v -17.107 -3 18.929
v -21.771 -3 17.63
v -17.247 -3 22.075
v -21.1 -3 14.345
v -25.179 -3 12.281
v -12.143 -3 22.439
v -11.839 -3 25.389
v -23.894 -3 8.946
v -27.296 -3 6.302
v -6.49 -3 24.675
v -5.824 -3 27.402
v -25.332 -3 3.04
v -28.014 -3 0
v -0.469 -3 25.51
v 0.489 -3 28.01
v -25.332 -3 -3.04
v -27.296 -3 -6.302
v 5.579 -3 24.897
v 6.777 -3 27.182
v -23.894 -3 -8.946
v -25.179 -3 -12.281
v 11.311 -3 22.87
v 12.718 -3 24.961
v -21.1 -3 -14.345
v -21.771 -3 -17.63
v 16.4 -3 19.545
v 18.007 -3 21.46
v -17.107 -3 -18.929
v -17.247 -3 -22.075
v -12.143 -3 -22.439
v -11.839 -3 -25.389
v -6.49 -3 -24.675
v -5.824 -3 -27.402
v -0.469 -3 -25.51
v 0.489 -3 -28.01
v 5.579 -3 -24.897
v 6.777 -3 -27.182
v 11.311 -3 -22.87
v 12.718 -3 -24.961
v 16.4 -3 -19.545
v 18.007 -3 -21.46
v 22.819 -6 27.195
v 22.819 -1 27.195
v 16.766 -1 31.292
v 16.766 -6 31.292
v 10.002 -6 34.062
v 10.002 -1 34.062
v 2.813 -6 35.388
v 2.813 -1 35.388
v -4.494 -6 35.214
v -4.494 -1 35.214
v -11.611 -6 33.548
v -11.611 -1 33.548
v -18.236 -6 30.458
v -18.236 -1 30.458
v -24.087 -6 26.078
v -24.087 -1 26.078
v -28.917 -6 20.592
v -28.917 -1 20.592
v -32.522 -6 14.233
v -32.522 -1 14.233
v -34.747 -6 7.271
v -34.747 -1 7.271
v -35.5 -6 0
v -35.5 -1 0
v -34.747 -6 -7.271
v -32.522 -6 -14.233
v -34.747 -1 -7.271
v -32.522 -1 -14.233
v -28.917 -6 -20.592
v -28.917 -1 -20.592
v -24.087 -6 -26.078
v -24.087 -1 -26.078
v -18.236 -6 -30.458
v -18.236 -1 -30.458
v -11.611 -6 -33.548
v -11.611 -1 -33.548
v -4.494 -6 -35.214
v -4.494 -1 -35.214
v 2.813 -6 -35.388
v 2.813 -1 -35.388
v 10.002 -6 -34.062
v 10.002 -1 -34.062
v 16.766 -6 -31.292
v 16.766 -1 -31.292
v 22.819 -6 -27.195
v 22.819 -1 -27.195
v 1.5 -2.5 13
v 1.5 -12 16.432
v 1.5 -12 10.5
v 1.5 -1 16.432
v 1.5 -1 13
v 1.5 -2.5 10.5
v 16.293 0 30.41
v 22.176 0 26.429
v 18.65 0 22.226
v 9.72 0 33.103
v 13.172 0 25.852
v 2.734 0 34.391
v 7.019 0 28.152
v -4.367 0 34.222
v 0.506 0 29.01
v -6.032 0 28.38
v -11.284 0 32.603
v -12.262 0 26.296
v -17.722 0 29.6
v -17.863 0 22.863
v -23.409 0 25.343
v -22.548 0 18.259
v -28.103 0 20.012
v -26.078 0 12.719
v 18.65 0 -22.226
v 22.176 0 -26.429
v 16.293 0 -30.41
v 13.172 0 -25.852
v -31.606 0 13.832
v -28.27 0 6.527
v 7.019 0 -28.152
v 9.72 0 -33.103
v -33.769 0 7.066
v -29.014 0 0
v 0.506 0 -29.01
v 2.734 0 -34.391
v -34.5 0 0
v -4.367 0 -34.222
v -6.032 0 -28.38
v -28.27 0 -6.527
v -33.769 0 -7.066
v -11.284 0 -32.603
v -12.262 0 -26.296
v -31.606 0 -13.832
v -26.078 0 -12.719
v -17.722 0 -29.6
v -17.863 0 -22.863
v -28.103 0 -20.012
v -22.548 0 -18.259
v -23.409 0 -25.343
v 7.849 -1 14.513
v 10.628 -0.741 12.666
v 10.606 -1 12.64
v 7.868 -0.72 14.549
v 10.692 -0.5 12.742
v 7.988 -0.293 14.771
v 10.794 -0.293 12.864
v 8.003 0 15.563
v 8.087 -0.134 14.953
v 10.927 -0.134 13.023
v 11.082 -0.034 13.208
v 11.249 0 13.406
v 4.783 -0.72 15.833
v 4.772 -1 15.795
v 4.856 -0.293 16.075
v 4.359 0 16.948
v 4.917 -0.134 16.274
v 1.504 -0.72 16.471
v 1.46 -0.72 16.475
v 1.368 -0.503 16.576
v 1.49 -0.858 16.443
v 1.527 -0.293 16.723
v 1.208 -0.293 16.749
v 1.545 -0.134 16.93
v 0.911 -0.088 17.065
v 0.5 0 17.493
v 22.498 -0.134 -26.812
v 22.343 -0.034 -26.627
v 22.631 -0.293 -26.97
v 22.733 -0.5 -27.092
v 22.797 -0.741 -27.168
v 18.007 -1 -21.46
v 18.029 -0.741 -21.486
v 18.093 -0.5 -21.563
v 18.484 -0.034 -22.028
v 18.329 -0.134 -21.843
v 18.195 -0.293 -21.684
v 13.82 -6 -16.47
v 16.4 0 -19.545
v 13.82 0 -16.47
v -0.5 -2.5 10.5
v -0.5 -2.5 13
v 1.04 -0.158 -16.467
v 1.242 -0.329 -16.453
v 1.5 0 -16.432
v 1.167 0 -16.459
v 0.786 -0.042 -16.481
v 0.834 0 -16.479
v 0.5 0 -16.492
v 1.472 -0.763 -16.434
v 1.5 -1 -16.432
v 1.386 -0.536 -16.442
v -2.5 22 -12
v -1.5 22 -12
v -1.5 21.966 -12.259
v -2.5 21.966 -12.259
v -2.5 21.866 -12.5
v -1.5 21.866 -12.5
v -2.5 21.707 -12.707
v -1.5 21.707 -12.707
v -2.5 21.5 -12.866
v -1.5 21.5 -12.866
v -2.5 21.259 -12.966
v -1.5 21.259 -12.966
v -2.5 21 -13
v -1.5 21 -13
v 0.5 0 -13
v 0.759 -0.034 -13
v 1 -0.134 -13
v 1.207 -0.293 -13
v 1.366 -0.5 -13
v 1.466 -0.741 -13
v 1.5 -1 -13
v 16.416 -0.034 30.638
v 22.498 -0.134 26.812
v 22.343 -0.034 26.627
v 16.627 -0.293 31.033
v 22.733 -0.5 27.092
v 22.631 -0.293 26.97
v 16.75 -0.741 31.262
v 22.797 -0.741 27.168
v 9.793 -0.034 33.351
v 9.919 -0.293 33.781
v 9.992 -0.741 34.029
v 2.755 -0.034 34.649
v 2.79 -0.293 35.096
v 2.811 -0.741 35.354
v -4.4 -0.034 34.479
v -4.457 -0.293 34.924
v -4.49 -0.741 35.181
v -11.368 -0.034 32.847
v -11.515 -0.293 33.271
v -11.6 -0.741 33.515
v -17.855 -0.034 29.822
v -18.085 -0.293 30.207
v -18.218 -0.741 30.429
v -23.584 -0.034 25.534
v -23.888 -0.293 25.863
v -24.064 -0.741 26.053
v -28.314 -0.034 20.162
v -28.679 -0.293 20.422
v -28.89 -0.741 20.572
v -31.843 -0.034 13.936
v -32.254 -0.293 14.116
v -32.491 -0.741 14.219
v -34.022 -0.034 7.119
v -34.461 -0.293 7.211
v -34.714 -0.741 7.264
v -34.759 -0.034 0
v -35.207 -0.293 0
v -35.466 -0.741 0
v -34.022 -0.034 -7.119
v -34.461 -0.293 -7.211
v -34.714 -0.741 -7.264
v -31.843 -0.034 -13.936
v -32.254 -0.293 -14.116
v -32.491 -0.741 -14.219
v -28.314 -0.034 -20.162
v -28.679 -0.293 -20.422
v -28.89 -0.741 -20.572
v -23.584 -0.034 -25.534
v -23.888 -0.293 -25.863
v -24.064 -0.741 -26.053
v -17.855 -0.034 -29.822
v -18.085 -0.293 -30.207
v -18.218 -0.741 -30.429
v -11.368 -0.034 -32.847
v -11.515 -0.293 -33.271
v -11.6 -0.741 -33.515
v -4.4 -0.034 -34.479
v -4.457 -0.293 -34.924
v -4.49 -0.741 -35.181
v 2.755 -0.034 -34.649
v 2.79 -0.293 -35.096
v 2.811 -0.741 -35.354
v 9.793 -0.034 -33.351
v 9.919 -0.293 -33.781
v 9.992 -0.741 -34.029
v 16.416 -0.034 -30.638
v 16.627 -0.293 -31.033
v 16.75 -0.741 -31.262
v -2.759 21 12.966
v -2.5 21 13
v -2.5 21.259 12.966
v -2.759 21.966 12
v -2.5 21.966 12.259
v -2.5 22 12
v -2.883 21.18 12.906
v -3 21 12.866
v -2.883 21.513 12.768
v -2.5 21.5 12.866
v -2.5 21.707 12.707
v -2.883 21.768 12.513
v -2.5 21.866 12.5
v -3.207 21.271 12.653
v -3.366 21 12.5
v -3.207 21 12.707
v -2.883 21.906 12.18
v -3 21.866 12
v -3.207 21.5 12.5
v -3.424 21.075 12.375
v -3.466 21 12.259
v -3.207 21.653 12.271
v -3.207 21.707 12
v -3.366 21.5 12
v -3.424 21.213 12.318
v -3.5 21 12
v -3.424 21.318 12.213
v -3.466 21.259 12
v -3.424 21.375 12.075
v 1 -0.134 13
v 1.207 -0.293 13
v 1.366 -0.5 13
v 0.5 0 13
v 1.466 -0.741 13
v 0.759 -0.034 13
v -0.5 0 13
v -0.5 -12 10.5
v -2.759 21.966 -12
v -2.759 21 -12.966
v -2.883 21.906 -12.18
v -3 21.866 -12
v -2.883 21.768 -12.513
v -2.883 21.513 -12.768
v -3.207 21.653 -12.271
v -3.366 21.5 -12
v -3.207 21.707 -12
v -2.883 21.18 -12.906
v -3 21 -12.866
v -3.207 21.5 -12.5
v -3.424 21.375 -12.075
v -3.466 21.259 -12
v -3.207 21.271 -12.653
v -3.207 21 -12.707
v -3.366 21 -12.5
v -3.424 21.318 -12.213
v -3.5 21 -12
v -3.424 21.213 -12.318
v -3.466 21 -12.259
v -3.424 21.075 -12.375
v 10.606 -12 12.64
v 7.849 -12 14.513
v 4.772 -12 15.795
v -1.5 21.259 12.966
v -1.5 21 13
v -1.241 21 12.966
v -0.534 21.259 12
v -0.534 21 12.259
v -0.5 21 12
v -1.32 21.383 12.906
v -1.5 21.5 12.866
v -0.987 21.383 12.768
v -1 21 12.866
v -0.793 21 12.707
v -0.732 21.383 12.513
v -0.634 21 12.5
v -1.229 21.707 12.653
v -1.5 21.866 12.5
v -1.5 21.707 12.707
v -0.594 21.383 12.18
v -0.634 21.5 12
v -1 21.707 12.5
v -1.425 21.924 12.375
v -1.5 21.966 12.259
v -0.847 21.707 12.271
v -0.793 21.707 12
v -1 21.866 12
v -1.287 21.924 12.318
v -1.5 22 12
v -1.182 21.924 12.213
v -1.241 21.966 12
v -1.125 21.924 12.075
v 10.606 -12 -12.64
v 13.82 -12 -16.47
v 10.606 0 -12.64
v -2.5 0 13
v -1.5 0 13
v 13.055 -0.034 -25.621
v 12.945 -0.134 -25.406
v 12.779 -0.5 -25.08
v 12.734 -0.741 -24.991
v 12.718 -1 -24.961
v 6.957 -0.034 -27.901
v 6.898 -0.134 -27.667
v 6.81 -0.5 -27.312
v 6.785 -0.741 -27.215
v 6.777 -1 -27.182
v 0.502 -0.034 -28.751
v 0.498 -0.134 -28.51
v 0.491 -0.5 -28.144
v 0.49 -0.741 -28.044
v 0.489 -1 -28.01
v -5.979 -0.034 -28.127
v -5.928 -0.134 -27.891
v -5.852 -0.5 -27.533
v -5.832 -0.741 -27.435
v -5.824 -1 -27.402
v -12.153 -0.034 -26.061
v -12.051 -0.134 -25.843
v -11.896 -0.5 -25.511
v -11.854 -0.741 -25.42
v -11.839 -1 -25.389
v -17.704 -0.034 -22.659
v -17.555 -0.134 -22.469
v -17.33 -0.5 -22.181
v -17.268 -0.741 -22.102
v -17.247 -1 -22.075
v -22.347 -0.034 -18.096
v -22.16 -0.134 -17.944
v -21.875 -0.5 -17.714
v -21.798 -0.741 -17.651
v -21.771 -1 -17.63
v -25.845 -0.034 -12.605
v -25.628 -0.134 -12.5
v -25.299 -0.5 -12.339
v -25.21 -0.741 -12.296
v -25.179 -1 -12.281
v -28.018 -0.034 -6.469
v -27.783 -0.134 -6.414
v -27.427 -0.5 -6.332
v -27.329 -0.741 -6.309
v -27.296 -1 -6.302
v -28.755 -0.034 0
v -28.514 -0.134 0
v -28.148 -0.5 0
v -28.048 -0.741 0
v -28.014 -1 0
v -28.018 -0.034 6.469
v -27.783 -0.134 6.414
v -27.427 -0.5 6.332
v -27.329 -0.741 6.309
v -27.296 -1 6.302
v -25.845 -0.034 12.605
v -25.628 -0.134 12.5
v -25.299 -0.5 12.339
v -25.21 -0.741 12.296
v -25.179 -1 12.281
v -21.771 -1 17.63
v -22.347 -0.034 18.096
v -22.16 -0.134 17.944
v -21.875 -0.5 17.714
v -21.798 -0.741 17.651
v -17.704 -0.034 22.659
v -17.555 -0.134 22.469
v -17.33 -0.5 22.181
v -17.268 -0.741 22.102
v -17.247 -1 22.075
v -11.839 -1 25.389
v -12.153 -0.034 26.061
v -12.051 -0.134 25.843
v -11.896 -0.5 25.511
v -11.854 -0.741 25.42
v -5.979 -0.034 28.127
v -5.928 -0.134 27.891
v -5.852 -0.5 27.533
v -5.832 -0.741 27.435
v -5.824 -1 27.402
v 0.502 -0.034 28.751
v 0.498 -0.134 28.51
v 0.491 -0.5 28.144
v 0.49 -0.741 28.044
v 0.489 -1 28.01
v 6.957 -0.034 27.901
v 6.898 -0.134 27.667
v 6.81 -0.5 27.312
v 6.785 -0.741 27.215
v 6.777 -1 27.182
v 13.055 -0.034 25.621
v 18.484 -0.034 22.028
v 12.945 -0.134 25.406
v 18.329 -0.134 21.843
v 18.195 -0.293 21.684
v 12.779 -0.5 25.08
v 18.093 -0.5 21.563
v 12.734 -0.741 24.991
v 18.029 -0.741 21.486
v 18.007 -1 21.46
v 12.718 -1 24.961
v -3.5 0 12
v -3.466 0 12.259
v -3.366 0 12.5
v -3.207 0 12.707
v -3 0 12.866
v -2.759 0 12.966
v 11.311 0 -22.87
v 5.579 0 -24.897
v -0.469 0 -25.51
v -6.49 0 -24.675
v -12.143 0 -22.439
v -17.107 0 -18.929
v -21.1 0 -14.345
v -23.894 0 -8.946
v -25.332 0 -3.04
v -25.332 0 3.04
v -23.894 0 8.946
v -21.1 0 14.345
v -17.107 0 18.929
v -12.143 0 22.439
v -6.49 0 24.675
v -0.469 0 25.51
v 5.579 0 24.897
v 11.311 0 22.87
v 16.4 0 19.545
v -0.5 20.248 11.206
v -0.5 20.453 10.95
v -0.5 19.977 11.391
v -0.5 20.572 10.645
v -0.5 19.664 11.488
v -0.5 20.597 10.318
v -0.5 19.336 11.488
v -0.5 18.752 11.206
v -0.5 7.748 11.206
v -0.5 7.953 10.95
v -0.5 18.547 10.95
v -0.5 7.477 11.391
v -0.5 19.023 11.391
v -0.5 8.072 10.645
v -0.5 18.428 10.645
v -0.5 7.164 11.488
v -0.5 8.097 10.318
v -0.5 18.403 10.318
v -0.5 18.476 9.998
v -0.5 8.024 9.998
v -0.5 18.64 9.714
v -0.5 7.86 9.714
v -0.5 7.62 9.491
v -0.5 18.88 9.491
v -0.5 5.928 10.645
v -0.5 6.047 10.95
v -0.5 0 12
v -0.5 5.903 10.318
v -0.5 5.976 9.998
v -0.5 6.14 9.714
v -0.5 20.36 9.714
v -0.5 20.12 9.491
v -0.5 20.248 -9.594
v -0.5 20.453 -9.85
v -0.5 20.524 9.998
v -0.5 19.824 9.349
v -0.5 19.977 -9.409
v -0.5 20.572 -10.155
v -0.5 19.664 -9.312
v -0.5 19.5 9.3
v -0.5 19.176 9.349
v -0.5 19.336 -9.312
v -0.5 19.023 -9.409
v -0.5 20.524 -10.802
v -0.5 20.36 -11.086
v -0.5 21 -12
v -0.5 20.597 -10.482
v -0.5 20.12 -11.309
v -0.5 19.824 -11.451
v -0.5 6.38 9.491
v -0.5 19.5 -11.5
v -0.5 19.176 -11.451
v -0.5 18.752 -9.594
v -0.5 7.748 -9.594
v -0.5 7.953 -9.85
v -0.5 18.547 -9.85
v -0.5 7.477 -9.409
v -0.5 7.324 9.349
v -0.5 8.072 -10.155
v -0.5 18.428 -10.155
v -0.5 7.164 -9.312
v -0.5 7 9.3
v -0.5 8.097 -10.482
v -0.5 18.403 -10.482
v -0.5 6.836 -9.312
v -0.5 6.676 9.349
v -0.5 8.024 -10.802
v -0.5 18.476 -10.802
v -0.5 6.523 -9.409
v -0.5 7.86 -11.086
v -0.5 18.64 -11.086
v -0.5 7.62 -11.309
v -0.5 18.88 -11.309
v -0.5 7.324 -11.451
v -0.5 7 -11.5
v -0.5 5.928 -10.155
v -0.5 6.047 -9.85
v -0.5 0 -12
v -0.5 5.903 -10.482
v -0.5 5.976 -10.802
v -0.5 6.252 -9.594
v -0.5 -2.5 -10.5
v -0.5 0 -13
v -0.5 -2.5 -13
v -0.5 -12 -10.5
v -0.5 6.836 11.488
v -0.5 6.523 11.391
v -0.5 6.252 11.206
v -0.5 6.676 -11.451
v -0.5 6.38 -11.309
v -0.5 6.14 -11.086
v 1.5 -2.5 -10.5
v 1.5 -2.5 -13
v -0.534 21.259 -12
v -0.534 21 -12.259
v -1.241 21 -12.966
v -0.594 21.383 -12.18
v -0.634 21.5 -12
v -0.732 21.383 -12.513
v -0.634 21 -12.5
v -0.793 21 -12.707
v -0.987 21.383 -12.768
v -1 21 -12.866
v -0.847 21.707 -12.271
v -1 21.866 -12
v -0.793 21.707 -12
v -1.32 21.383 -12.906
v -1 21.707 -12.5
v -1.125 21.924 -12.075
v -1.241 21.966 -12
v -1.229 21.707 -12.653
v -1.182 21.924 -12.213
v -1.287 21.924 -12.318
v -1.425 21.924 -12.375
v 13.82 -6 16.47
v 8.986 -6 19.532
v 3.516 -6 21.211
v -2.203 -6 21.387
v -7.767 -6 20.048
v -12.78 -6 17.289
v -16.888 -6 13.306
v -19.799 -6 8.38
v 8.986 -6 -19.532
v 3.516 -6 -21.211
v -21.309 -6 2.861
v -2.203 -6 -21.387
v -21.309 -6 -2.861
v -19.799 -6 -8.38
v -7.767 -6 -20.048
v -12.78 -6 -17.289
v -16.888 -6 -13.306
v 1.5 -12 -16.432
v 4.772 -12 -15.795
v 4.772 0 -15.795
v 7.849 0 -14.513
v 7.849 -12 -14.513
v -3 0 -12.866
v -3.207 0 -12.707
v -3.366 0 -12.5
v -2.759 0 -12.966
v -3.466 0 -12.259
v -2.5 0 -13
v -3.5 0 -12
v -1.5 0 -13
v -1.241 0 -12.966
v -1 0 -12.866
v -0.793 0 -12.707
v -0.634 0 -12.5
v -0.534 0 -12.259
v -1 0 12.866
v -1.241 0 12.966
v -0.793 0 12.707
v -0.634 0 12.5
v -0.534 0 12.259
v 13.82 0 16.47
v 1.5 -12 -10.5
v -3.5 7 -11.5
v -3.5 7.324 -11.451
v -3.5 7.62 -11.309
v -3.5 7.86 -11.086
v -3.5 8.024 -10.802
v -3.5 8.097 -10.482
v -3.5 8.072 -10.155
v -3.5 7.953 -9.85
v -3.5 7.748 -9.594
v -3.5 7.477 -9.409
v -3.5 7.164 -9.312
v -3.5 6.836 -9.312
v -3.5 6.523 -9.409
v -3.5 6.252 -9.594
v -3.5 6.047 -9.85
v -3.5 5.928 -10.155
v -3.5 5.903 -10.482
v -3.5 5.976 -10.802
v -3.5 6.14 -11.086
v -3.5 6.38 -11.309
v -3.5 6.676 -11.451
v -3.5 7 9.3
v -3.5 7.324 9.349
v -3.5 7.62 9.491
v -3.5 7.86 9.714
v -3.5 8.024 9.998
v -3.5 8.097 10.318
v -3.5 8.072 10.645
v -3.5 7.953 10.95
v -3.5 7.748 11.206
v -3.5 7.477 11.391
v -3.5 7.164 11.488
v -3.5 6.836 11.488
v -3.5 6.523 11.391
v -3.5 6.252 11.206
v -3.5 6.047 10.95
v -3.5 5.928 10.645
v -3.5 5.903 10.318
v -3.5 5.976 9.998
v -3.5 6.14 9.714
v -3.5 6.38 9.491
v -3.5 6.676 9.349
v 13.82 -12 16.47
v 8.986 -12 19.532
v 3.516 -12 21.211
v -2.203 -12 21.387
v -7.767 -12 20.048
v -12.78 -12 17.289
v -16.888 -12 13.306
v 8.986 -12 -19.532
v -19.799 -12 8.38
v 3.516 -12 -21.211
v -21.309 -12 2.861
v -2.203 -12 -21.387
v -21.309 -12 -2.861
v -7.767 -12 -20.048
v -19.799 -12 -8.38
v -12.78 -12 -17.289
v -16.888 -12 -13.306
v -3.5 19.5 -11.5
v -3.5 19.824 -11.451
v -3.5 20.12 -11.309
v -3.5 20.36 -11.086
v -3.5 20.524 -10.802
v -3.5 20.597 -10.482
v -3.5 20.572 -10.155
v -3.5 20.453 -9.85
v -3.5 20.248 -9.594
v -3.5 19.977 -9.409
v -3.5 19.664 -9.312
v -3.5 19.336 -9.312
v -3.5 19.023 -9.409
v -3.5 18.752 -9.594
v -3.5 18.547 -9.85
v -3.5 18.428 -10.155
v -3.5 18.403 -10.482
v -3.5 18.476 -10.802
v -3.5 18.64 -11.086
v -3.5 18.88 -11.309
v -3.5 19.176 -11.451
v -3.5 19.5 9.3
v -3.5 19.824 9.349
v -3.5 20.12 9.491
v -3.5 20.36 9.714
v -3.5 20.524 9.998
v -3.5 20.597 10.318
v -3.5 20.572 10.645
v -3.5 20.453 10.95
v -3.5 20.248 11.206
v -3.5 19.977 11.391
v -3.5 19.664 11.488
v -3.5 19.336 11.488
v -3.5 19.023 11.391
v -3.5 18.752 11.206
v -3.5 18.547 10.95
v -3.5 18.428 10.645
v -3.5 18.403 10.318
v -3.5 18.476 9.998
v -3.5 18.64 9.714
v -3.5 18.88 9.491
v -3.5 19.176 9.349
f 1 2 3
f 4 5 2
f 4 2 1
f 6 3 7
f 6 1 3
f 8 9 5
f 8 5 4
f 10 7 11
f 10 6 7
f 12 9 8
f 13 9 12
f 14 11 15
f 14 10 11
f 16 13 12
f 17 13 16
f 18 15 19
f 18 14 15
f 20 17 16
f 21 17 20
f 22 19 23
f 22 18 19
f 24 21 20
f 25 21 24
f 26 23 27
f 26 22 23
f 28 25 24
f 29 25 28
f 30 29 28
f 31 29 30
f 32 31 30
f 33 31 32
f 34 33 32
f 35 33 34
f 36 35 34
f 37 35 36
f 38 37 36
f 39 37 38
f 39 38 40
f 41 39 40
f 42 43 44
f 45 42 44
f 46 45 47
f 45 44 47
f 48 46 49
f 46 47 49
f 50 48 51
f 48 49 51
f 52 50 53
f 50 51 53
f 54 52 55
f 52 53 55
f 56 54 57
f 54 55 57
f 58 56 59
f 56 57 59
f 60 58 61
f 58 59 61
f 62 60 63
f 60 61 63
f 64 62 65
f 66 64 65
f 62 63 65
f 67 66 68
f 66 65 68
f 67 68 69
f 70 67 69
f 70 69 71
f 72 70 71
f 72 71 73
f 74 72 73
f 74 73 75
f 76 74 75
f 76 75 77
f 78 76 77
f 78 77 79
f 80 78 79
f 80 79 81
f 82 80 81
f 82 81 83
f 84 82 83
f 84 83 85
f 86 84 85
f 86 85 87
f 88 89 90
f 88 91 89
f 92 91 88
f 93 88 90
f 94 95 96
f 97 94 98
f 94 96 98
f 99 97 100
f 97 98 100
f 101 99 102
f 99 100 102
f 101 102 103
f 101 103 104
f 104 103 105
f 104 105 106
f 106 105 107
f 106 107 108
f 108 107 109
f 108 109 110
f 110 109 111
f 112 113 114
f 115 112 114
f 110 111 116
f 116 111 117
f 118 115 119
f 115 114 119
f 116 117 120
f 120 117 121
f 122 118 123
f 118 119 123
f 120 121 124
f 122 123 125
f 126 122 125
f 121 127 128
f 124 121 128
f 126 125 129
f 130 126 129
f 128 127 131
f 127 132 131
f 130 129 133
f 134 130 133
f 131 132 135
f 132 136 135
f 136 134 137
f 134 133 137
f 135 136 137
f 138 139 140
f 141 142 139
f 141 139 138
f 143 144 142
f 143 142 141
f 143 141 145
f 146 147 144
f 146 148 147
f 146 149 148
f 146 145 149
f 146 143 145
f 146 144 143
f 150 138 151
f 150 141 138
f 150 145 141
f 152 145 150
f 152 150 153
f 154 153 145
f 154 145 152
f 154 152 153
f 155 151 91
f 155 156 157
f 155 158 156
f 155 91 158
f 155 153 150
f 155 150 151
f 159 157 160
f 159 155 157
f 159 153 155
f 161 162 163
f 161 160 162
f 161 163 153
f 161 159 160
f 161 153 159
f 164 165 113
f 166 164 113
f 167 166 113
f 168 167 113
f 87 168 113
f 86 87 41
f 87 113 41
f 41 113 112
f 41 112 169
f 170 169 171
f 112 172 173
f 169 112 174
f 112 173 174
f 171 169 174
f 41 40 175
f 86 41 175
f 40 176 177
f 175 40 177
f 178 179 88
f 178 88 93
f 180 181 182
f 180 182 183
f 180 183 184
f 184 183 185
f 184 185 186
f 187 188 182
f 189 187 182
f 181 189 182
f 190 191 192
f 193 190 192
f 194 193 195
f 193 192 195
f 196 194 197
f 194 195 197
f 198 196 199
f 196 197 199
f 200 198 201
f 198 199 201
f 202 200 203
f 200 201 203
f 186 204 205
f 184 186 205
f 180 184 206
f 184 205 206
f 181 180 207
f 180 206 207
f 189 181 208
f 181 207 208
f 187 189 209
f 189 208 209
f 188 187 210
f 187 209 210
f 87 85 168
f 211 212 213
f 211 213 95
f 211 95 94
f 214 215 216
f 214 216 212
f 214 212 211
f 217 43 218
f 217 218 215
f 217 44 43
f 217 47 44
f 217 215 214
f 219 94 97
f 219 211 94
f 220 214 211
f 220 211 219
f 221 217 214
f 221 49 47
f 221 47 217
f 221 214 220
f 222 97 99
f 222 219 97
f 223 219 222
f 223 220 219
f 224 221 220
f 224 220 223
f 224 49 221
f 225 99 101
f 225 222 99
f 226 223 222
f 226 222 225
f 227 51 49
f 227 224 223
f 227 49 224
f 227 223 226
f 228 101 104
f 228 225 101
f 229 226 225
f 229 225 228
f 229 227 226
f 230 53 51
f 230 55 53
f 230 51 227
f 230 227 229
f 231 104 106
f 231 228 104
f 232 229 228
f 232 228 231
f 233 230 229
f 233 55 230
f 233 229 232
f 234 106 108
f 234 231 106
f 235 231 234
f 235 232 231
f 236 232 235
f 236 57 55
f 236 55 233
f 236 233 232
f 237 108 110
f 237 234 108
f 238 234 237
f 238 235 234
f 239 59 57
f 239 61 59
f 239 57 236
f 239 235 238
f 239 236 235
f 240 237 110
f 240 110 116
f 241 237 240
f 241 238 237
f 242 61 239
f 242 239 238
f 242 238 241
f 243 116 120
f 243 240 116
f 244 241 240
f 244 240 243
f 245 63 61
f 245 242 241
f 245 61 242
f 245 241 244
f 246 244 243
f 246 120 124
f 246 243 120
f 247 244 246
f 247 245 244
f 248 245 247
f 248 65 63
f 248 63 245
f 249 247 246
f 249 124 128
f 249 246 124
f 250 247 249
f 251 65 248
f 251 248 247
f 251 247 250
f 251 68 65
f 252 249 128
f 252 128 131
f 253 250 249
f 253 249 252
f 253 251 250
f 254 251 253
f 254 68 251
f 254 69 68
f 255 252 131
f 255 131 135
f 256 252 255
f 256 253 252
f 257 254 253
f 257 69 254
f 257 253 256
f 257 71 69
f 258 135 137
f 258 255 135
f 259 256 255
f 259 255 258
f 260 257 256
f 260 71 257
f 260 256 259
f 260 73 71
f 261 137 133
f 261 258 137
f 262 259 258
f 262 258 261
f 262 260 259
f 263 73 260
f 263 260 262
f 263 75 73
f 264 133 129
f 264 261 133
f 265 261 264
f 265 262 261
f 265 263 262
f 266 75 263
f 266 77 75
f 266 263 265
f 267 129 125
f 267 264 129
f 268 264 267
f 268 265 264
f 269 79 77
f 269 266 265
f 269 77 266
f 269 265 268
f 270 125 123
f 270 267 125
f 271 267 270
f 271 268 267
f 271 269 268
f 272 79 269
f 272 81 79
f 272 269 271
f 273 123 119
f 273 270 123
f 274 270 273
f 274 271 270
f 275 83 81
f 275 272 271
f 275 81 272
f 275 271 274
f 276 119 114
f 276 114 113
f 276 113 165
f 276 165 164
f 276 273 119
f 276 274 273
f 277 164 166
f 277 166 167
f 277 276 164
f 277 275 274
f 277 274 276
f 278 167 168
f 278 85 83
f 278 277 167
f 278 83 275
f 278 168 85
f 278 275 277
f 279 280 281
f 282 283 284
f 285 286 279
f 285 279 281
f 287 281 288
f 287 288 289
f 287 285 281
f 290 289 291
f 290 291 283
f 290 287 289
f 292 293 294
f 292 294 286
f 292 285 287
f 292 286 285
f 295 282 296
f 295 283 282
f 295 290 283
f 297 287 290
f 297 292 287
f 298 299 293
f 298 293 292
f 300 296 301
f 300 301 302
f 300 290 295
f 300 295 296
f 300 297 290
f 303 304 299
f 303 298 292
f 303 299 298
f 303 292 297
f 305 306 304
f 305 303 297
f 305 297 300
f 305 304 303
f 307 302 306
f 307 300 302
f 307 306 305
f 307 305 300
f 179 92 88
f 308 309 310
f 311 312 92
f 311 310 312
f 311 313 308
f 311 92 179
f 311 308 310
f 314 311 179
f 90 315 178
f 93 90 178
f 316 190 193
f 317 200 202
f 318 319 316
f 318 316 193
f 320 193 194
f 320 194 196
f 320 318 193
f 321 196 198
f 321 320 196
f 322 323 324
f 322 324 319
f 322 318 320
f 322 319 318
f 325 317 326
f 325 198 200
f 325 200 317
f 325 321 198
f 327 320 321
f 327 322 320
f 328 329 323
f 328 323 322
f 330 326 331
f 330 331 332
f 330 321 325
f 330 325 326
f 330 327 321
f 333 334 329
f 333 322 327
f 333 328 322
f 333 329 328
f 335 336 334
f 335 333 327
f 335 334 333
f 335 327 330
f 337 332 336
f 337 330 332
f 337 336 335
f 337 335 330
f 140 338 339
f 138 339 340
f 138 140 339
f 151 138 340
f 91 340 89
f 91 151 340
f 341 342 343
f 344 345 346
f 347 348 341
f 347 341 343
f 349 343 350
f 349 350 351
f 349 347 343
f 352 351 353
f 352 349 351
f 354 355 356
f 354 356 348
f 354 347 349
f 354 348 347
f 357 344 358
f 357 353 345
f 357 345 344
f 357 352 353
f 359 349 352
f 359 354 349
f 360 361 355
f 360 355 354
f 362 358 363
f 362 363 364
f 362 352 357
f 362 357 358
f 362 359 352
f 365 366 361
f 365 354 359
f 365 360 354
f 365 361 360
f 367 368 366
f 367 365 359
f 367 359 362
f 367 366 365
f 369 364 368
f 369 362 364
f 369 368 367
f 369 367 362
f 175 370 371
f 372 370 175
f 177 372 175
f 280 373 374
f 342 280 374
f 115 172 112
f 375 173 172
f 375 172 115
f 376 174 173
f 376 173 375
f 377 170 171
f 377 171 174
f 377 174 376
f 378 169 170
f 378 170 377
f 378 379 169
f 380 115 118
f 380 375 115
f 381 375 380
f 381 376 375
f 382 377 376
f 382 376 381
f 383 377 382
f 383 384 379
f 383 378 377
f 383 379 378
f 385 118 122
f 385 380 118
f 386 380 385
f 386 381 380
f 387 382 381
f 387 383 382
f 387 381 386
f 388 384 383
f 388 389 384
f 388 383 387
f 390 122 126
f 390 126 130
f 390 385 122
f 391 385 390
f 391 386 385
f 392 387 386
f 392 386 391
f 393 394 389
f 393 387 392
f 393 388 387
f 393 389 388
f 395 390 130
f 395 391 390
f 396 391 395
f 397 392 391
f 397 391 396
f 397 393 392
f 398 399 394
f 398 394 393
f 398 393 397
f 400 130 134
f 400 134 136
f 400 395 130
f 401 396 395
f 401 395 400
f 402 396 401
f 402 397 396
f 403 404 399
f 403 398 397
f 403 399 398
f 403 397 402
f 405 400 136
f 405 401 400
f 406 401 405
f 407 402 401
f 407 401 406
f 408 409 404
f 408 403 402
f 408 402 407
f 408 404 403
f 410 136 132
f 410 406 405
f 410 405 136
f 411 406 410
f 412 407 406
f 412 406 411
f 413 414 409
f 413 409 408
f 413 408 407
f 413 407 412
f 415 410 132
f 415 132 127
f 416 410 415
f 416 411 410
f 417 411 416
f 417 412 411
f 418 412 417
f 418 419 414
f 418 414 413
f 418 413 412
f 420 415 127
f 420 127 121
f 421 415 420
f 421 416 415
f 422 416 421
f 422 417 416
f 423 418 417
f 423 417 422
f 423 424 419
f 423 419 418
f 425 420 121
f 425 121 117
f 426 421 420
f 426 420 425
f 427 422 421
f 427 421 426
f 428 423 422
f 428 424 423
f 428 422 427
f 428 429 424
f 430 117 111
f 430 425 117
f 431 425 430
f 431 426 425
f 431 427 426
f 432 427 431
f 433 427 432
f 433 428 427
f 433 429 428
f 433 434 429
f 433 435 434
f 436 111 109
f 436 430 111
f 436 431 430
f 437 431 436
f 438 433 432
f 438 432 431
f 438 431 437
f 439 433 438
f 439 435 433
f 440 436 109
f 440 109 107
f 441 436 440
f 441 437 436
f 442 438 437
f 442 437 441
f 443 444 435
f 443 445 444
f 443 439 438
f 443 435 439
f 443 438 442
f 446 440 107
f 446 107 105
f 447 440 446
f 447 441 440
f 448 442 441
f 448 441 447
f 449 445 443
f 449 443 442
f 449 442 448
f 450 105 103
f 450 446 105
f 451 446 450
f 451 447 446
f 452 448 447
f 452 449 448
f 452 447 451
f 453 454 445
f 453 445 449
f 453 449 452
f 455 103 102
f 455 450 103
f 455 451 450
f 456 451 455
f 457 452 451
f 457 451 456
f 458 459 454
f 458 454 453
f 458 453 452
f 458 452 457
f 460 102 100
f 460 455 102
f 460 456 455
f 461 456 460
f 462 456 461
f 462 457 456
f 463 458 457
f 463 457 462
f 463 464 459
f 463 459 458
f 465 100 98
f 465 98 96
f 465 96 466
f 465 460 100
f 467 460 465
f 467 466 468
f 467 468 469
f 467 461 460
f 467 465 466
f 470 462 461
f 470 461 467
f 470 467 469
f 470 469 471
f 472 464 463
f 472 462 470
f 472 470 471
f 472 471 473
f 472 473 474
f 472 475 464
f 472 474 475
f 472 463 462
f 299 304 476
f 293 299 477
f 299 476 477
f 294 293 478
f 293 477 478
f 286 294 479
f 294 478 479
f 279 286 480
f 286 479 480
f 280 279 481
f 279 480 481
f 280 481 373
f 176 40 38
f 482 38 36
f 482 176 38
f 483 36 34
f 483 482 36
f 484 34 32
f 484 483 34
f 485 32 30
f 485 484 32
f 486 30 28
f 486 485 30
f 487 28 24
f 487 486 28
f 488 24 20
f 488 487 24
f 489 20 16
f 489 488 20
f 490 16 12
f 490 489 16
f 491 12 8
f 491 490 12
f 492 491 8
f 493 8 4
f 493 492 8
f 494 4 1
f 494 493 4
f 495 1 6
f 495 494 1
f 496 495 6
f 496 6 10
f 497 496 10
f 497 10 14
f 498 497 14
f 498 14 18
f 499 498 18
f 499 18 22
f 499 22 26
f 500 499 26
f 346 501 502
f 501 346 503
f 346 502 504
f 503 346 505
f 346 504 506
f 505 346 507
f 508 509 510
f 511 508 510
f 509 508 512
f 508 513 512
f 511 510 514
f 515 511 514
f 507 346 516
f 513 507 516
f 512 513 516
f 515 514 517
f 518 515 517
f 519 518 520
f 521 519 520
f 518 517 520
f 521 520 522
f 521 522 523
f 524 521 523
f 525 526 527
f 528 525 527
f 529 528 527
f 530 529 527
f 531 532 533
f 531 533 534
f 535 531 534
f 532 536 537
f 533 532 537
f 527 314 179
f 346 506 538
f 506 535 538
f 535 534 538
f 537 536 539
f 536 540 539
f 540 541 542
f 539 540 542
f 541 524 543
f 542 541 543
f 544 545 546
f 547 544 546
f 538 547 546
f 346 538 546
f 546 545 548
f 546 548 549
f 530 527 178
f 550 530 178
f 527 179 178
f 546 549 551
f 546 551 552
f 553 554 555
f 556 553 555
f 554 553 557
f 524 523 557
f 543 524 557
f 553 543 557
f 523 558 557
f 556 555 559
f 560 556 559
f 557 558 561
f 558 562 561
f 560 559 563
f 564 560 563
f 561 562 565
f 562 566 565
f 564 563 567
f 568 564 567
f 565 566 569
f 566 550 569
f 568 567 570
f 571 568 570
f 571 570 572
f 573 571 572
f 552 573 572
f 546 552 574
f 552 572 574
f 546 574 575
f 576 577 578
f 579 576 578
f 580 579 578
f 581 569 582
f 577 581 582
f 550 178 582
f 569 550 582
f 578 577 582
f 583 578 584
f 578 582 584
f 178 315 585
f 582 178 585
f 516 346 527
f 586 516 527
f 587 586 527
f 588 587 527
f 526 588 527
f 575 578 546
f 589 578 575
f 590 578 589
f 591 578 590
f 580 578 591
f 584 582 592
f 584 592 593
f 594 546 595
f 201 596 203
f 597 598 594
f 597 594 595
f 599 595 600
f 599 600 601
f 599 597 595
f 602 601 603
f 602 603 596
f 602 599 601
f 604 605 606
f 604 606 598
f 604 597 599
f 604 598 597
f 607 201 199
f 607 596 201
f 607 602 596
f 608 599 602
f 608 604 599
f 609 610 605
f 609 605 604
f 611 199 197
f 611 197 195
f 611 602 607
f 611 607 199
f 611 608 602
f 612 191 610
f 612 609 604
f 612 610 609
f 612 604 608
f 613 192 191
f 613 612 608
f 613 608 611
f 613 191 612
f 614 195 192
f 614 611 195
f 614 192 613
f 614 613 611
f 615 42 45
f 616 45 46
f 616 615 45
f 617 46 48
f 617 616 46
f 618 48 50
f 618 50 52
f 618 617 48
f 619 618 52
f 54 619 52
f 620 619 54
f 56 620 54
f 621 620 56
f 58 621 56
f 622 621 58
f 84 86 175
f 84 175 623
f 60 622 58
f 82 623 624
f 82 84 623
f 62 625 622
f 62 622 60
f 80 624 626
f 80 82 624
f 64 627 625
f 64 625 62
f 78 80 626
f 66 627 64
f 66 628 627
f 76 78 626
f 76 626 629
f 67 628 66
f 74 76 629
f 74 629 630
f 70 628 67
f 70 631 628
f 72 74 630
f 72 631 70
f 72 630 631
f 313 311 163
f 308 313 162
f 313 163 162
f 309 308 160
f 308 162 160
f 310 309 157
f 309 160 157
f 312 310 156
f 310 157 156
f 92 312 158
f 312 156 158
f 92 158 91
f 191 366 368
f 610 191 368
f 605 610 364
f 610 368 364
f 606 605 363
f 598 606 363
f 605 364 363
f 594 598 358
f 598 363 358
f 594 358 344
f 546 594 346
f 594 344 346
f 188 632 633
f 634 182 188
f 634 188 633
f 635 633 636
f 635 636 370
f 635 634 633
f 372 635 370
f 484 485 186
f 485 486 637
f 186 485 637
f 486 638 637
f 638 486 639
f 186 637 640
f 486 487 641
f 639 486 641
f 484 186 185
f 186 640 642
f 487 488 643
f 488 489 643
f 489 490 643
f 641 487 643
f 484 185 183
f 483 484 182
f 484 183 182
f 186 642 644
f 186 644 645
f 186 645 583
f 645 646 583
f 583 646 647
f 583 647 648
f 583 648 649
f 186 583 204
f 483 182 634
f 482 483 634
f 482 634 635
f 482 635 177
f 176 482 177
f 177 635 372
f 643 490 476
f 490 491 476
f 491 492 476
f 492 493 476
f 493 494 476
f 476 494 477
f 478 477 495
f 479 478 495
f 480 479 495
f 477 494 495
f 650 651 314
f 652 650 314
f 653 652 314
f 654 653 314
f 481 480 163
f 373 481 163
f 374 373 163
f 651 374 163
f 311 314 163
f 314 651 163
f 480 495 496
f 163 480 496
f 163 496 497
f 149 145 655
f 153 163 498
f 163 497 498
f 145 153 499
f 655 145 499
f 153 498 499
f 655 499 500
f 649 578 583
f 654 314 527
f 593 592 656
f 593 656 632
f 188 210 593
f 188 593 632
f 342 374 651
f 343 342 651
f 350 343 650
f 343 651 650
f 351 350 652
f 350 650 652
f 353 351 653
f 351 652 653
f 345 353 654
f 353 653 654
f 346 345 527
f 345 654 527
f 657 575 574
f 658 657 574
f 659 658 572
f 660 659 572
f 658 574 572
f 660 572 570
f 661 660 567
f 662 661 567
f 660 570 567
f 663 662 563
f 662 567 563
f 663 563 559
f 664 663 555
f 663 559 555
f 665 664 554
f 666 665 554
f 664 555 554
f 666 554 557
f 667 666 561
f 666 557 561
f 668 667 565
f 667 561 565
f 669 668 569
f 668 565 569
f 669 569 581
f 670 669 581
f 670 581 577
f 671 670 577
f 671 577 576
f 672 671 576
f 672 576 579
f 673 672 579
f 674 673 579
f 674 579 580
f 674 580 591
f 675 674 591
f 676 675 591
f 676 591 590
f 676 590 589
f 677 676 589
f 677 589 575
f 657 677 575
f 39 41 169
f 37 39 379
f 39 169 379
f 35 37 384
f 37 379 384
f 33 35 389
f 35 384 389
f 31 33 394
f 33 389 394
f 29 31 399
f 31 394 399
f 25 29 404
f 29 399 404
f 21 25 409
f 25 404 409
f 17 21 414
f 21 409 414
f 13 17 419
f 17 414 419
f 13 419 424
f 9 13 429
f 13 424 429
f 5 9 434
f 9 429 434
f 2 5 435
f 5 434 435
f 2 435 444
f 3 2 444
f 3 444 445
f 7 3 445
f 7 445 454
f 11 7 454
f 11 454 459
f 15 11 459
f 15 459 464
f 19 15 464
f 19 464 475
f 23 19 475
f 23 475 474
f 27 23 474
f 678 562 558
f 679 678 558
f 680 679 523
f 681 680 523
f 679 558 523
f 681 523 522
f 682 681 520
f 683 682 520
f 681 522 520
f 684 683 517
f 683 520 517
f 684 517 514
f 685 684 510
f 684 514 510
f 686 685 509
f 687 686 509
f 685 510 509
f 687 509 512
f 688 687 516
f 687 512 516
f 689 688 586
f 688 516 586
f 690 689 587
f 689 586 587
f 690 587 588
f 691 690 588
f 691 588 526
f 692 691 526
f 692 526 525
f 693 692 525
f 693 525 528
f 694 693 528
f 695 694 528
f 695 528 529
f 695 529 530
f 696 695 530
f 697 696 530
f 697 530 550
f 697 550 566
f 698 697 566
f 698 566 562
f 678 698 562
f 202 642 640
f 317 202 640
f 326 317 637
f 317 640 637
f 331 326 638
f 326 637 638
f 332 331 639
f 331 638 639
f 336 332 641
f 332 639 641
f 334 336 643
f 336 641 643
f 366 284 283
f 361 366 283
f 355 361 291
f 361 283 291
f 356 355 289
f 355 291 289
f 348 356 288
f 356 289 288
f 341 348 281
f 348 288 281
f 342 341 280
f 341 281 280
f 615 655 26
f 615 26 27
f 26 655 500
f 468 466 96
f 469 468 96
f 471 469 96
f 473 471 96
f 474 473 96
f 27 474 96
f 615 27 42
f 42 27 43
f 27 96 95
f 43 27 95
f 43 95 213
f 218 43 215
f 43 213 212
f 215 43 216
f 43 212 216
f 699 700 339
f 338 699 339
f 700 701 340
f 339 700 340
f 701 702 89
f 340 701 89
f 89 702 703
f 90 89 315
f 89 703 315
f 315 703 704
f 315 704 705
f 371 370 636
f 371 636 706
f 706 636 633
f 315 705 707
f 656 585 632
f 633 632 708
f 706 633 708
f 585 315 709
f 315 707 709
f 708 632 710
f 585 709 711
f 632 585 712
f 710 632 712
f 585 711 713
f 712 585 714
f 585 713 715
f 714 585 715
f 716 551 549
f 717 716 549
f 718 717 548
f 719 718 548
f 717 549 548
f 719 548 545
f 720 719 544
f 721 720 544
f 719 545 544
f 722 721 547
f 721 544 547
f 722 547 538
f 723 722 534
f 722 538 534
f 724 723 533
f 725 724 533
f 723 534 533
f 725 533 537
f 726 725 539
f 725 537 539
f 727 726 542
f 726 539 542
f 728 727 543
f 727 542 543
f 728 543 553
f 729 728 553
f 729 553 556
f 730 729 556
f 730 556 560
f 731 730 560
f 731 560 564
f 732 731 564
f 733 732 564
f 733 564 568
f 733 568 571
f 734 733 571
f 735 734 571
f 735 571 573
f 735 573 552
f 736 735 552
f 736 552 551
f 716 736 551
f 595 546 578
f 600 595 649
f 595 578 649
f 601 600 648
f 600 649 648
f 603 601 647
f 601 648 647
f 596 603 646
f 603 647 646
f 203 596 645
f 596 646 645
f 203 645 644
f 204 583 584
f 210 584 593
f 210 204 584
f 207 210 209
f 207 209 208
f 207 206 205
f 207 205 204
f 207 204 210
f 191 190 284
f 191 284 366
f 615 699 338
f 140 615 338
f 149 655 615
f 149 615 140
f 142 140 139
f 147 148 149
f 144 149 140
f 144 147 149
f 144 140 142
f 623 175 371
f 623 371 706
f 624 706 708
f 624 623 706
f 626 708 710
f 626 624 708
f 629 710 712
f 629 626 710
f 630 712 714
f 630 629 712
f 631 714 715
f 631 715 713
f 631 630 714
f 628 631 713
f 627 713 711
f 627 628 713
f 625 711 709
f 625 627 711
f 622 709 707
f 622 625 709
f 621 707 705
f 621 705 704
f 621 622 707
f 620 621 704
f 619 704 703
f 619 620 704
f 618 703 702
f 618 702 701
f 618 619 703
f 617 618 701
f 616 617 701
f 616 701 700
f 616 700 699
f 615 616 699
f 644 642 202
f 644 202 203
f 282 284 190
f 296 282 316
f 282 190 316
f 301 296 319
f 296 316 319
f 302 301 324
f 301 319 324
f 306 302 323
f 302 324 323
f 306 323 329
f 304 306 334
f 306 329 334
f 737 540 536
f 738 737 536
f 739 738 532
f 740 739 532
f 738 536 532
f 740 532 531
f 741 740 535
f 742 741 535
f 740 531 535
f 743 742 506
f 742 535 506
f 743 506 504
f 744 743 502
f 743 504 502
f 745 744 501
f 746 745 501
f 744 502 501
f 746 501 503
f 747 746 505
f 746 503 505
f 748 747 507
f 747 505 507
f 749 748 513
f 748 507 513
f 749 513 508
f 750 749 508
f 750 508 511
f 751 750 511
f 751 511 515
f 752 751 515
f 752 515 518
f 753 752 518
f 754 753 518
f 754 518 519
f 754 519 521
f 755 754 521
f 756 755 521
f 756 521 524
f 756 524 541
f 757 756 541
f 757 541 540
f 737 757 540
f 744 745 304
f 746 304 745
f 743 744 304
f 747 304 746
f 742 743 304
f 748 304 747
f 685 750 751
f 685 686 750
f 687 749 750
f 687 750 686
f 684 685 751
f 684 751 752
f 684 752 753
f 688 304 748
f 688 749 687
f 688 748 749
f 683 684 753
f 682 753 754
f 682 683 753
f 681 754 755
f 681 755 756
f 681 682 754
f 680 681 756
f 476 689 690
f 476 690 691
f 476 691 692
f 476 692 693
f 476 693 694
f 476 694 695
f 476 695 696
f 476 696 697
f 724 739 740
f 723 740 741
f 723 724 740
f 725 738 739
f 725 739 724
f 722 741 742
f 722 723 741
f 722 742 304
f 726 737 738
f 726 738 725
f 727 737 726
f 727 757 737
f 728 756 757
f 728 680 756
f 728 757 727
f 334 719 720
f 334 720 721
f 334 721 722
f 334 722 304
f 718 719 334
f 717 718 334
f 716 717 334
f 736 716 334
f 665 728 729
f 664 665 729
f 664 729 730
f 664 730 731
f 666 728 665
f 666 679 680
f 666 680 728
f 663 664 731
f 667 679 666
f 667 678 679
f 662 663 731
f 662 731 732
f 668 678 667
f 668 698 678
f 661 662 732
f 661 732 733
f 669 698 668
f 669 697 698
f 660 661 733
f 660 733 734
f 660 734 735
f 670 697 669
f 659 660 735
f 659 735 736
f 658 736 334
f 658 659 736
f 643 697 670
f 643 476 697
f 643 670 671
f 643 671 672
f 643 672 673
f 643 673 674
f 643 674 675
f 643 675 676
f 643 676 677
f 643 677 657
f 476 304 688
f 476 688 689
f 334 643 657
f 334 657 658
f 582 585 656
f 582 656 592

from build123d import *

# Parameters (mm, degrees)
RESSALTO_EXTRUS_O1_DEPTH = 12
RESSALTO_EXTRUS_O3_DEPTH = 6
ESBO_O4_W                = 3
ESBO_O4_H                = 26
RESSALTO_EXTRUS_O4_DEPTH = 22
ESBO_O6_W                = 2.5
ESBO_O6_H                = 9.5
RESSALTO_EXTRUS_O5_DEPTH = 2
ESBO_O7_R                = 1.1
CORTE_EXTRUS_O1_DEPTH    = 55.490824916
ESBO_O8_R                = 28.014084507
ESBO_O8_R_2              = 25.514084507
CORTE_EXTRUS_O2_DEPTH    = 3
FILETE1_R                = 1


with BuildPart() as part:
    # Esboço1 → Ressalto-extrusão1 (new body)
    with BuildSketch(Plane(origin=(0, 0, 0), x_dir=(1, 0, 0), z_dir=(0, 1, 0))):
        with BuildLine():
            Line((1.5, -16.431676725), (1.5, -13))
            Line((1.5, -13), (-0.5, -13))
            Line((-0.5, -13), (-0.5, 13))
            Line((-0.5, 13), (1.5, 13))
            Line((1.5, 13), (1.5, 16.431676725))
            ThreePointArc((1.5, 16.431676725), (6.342987532, 15.232088142), (10.60599556, 12.639733311))
            Line((10.60599556, 12.639733311), (13.819933608, 16.469955527))
            ThreePointArc((13.819933608, 16.469955527), (-21.5, 0), (13.819933608, -16.469955527))
            Line((13.819933608, -16.469955527), (10.60599556, -12.639733311))
            ThreePointArc((10.60599556, -12.639733311), (6.342987532, -15.232088142), (1.5, -16.431676725))
        make_face()
    extrude(amount=-RESSALTO_EXTRUS_O1_DEPTH)

    # Esboço3 → Ressalto-extrusão3 (add)
    with BuildSketch(Plane(origin=(0, 0, 0), x_dir=(1, 0, 0), z_dir=(0, 1, 0))):
        with BuildLine():
            Line((13.819933608, -16.469955527), (22.818960144, -27.194577731))
            ThreePointArc((22.818960144, -27.194577731), (-35.5, 0), (22.818960144, 27.194577731))
            Line((22.818960144, 27.194577731), (13.819933608, 16.469955527))
            ThreePointArc((13.819933608, 16.469955527), (-21.5, 0), (13.819933608, -16.469955527))
        make_face()
    extrude(amount=-RESSALTO_EXTRUS_O3_DEPTH)

    # Esboço4 → Ressalto-extrusão4 (add)
    with BuildSketch(Plane(origin=(0, 0, 0), x_dir=(1, 0, 0), z_dir=(0, 1, 0))):
        with Locations((-2, 0)):
            Rectangle(ESBO_O4_W, ESBO_O4_H)
    extrude(amount=RESSALTO_EXTRUS_O4_DEPTH)

    # Esboço6 → Ressalto-extrusão5 (add)
    with BuildSketch(Plane(origin=(-0.5, 0, 0), x_dir=(0, 0, -1), z_dir=(1, 0, 0))):
        with Locations((-11.75, -7.25)):
            Rectangle(ESBO_O6_W, ESBO_O6_H)
        with Locations((11.75, -7.25)):
            Rectangle(ESBO_O6_W, ESBO_O6_H)
    extrude(amount=RESSALTO_EXTRUS_O5_DEPTH)

    # Esboço7 → Corte-extrusão1 (cut, through all)
    with BuildSketch(Plane(origin=(-0.5, 0, 0), x_dir=(0, 0, -1), z_dir=(1, 0, 0))):
        with Locations((-10.4, 19.5)):
            Circle(ESBO_O7_R)
        with Locations((10.4, 19.5)):
            Circle(ESBO_O7_R)
        with Locations((10.4, 7)):
            Circle(ESBO_O7_R)
        with Locations((-10.4, 7)):
            Circle(ESBO_O7_R)
    extrude(amount=-CORTE_EXTRUS_O1_DEPTH, mode=Mode.SUBTRACT)

    # Esboço8 → Corte-extrusão2 (cut)
    with BuildSketch(Plane(origin=(0, 0, 0), x_dir=(1, 0, 0), z_dir=(0, 1, 0))):
        Circle(ESBO_O8_R)
        Circle(ESBO_O8_R_2, mode=Mode.SUBTRACT)
    extrude(amount=-CORTE_EXTRUS_O2_DEPTH, mode=Mode.SUBTRACT)

    # Filete1
    # the kernel refuses this fillet: 1 mm, written as the material it takes off along each edge
    with BuildSketch(Plane(origin=(-2.5, 21, 12), x_dir=(0, 0, 1), z_dir=(-1, 0, 0))) as filete1_piece_1_section:
        Polygon((0, 0), (FILETE1_R * 1.02, 0), (FILETE1_R * 1.02, FILETE1_R * 1.02), (0, FILETE1_R * 1.02), align=None)
    filete1_piece_1 = extrude(amount=FILETE1_R * 1.02, mode=Mode.PRIVATE)
    filete1_piece_1 = filete1_piece_1 - Plane(origin=(-2.5, 21, 12), x_dir=(0, -0.7071067811865475, -0.7071067811865475), z_dir=(-1, 0, 0)) * Sphere(FILETE1_R, mode=Mode.PRIVATE)
    add(filete1_piece_1, mode=Mode.SUBTRACT)
    with BuildSketch(Plane(origin=(-1.5, 21, 12), x_dir=(0, 0, 1), z_dir=(0, 1, 0))) as filete1_piece_2_section:
        Polygon((0, 0), (FILETE1_R * 1.02, 0), (FILETE1_R * 1.02, FILETE1_R * 1.02), (0, FILETE1_R * 1.02), align=None)
    filete1_piece_2 = extrude(amount=FILETE1_R * 1.02, mode=Mode.PRIVATE)
    filete1_piece_2 = filete1_piece_2 - Plane(origin=(-1.5, 21, 12), x_dir=(-0.7071067811865476, 0, -0.7071067811865475), z_dir=(0, 1, 0)) * Sphere(FILETE1_R, mode=Mode.PRIVATE)
    add(filete1_piece_2, mode=Mode.SUBTRACT)
    with BuildSketch(Plane(origin=(-1.5, 21, -12), x_dir=(1, 0, 0), z_dir=(0, 1, 0))) as filete1_piece_3_section:
        Polygon((0, 0), (FILETE1_R * 1.02, 0), (FILETE1_R * 1.02, FILETE1_R * 1.02), (0, FILETE1_R * 1.02), align=None)
    filete1_piece_3 = extrude(amount=FILETE1_R * 1.02, mode=Mode.PRIVATE)
    filete1_piece_3 = filete1_piece_3 - Plane(origin=(-1.5, 21, -12), x_dir=(-0.7071067811865475, 0, 0.7071067811865477), z_dir=(0, 1, 0)) * Sphere(FILETE1_R, mode=Mode.PRIVATE)
    add(filete1_piece_3, mode=Mode.SUBTRACT)
    with BuildSketch(Plane(origin=(-2.5, 21, -12), x_dir=(0, 1, 0), z_dir=(-1, 0, 0))) as filete1_piece_4_section:
        Polygon((0, 0), (FILETE1_R * 1.02, 0), (FILETE1_R * 1.02, FILETE1_R * 1.02), (0, FILETE1_R * 1.02), align=None)
    filete1_piece_4 = extrude(amount=FILETE1_R * 1.02, mode=Mode.PRIVATE)
    filete1_piece_4 = filete1_piece_4 - Plane(origin=(-2.5, 21, -12), x_dir=(0, -0.7071067811865475, 0.7071067811865475), z_dir=(-1, 0, 0)) * Sphere(FILETE1_R, mode=Mode.PRIVATE)
    add(filete1_piece_4, mode=Mode.SUBTRACT)
    with BuildSketch(Plane(origin=(1.5, 0, -10.5), x_dir=(-1, 0, 0), z_dir=(0, 0, -1))) as filete1_piece_5_section:
        with BuildLine():
            CenterArc((FILETE1_R, -FILETE1_R), FILETE1_R, 90, 90)
            Line((0, -FILETE1_R), (0, 0))
            Line((0, 0), (FILETE1_R, 0))
        make_face()
    filete1_piece_5 = extrude(amount=8.431676725, mode=Mode.PRIVATE)
    filete1_piece_5 = filete1_piece_5 & Plane(origin=(0, 0, 0), x_dir=(0.09090909090909027, 0, -0.9958591954639385), z_dir=(0, 1, 0)) * Cylinder(16.5, 21, mode=Mode.PRIVATE)
    add(filete1_piece_5, mode=Mode.SUBTRACT)
    with BuildSketch(Plane(origin=(0, 0, 0), x_dir=(0.7087130276081794, 0, -0.7054968777382703), z_dir=(0.7054968777382703, 0, 0.7087130276081794))) as filete1_piece_6:
        with BuildLine():
            CenterArc((28.014084507 + FILETE1_R, -FILETE1_R), FILETE1_R, 90, 90)
            Line((28.014084507, -FILETE1_R), (28.014084507, 0))
            Line((28.014084507, 0), (28.014084507 + FILETE1_R, 0))
        make_face()
    revolve(axis=Axis((0, 0, 0), (0, 1, 0)), revolution_arc=270.260599923, mode=Mode.SUBTRACT)
    with BuildSketch(Plane(origin=(1.5, 0, 18.931676725), x_dir=(-1, 0, 0), z_dir=(0, 0, -1))) as filete1_piece_7_section:
        with BuildLine():
            CenterArc((FILETE1_R, -FILETE1_R), FILETE1_R, 90, 90)
            Line((0, -FILETE1_R), (0, 0))
            Line((0, 0), (FILETE1_R, 0))
        make_face()
    filete1_piece_7 = extrude(amount=8.431676725, mode=Mode.PRIVATE)
    filete1_piece_7 = filete1_piece_7 & Plane(origin=(0, 0, 0), x_dir=(0.6427876096865377, 0, 0.7660444431189795), z_dir=(0, 1, 0)) * Cylinder(16.5, 21, mode=Mode.PRIVATE)
    add(filete1_piece_7, mode=Mode.SUBTRACT)
    with BuildSketch(Plane(origin=(0, 0, 0), x_dir=(0.7510532880617147, 0, 0.6602415910041466), z_dir=(0.6602415910041466, 0, -0.7510532880617147))) as filete1_piece_8_section:
        with BuildLine():
            CenterArc((16.5 + FILETE1_R, FILETE1_R), FILETE1_R, 180, 90)
            Line((16.5, FILETE1_R), (16.5, 0))
            Line((16.5, 0), (16.5 + FILETE1_R, 0))
        make_face()
    filete1_piece_8 = revolve(axis=Axis((0, 0, 0), (0, -1, 0)), revolution_arc=52.147490436, mode=Mode.PRIVATE)
    filete1_piece_8 = split(filete1_piece_8, bisect_by=Plane(origin=(1.5, 0, 0), z_dir=(1, 0, 0)), keep=Keep.TOP, mode=Mode.PRIVATE)
    add(filete1_piece_8, mode=Mode.SUBTRACT)
    with BuildSketch(Plane(origin=(0, 0, 0), x_dir=(0.6952666452885745, 0, 0.7187518987447418), z_dir=(0.7187518987447418, 0, -0.6952666452885745))) as filete1_piece_9:
        with BuildLine():
            CenterArc((35.5 - FILETE1_R, FILETE1_R), FILETE1_R, 270, 90)
            Line((35.5 - FILETE1_R, 0), (35.5, 0))
            Line((35.5, 0), (35.5, FILETE1_R))
        make_face()
    revolve(axis=Axis((0, 0, 0), (0, -1, 0)), revolution_arc=268.096938404, mode=Mode.SUBTRACT)
    with BuildSketch(Plane(origin=(-3.5, 0, 13), x_dir=(0, 0, -1), z_dir=(0, 1, 0)), Plane(origin=(-0.5, 0, 13), x_dir=(-1, 0, 0), z_dir=(0, 1, 0)), Plane(origin=(-3.5, 0, -13), x_dir=(1, 0, 0), z_dir=(0, 1, 0))) as filete1_piece_10:
        with BuildLine():
            CenterArc((FILETE1_R, -FILETE1_R), FILETE1_R, 90, 90)
            Line((0, -FILETE1_R), (0, 0))
            Line((0, 0), (FILETE1_R, 0))
        make_face()
    extrude(amount=21, mode=Mode.SUBTRACT)
    with BuildSketch(Plane(origin=(-0.5, 0, -13), x_dir=(-1, 0, 0), z_dir=(0, 1, 0))) as filete1_piece_11:
        with BuildLine():
            CenterArc((FILETE1_R, FILETE1_R), FILETE1_R, 180, 90)
            Line((0, FILETE1_R), (0, 0))
            Line((0, 0), (FILETE1_R, 0))
        make_face()
    extrude(amount=21, mode=Mode.SUBTRACT)
    with BuildSketch(Plane(origin=(-2.5, 22, 13), x_dir=(0, -1, 0), z_dir=(1, 0, 0)), Plane(origin=(-1.5, 22, -13), x_dir=(0, -1, 0), z_dir=(-1, 0, 0))) as filete1_piece_12:
        with BuildLine():
            CenterArc((FILETE1_R, FILETE1_R), FILETE1_R, 180, 90)
            Line((0, FILETE1_R), (0, 0))
            Line((0, 0), (FILETE1_R, 0))
        make_face()
    extrude(amount=1, mode=Mode.SUBTRACT)
    with BuildSketch(Plane(origin=(-0.5, 22, 12), x_dir=(0, -1, 0), z_dir=(0, 0, -1)), Plane(origin=(-3.5, 22, -12), x_dir=(0, -1, 0), z_dir=(0, 0, 1))) as filete1_piece_13:
        with BuildLine():
            CenterArc((FILETE1_R, FILETE1_R), FILETE1_R, 180, 90)
            Line((0, FILETE1_R), (0, 0))
            Line((0, 0), (FILETE1_R, 0))
        make_face()
    extrude(amount=24, mode=Mode.SUBTRACT)
    with BuildSketch(Plane(origin=(1.5, 0, 18.931676725), x_dir=(-1, 0, 0), z_dir=(0, 0, -1))) as filete1_piece_14a_section:
        with BuildLine():
            CenterArc((FILETE1_R, -FILETE1_R), FILETE1_R, 90, 90)
            Line((0, -FILETE1_R), (0, 0))
            Line((0, 0), (FILETE1_R, 0))
        make_face()
    filete1_piece_14a = extrude(amount=5.931676725, mode=Mode.PRIVATE)
    filete1_piece_14a = filete1_piece_14a - Plane(origin=(0, 0, 0), x_dir=(0.6427876096865377, 0, 0.7660444431189795), z_dir=(0, 1, 0)) * Cylinder(16.5, 16, mode=Mode.PRIVATE)
    with BuildSketch(Plane(origin=(0, 0, 0), x_dir=(0.6427876096865377, 0, 0.7660444431189793), z_dir=(0.7660444431189793, 0, -0.6427876096865377))) as filete1_piece_14b_section:
        with BuildLine():
            CenterArc((16.5 + FILETE1_R, FILETE1_R), FILETE1_R, 180, 90)
            Line((16.5, FILETE1_R), (16.5, 0))
            Line((16.5, 0), (16.5 + FILETE1_R, 0))
        make_face()
    filete1_piece_14b = revolve(axis=Axis((0, 0, 0), (0, -1, 0)), revolution_arc=43.465790933, mode=Mode.PRIVATE)
    filete1_piece_14b = split(filete1_piece_14b, bisect_by=Plane(origin=(1.5, 0, 0), z_dir=(-1, 0, 0)), keep=Keep.TOP, mode=Mode.PRIVATE)
    filete1_piece_14 = filete1_piece_14a & filete1_piece_14b
    add(filete1_piece_14, mode=Mode.SUBTRACT)


solid = part.part
